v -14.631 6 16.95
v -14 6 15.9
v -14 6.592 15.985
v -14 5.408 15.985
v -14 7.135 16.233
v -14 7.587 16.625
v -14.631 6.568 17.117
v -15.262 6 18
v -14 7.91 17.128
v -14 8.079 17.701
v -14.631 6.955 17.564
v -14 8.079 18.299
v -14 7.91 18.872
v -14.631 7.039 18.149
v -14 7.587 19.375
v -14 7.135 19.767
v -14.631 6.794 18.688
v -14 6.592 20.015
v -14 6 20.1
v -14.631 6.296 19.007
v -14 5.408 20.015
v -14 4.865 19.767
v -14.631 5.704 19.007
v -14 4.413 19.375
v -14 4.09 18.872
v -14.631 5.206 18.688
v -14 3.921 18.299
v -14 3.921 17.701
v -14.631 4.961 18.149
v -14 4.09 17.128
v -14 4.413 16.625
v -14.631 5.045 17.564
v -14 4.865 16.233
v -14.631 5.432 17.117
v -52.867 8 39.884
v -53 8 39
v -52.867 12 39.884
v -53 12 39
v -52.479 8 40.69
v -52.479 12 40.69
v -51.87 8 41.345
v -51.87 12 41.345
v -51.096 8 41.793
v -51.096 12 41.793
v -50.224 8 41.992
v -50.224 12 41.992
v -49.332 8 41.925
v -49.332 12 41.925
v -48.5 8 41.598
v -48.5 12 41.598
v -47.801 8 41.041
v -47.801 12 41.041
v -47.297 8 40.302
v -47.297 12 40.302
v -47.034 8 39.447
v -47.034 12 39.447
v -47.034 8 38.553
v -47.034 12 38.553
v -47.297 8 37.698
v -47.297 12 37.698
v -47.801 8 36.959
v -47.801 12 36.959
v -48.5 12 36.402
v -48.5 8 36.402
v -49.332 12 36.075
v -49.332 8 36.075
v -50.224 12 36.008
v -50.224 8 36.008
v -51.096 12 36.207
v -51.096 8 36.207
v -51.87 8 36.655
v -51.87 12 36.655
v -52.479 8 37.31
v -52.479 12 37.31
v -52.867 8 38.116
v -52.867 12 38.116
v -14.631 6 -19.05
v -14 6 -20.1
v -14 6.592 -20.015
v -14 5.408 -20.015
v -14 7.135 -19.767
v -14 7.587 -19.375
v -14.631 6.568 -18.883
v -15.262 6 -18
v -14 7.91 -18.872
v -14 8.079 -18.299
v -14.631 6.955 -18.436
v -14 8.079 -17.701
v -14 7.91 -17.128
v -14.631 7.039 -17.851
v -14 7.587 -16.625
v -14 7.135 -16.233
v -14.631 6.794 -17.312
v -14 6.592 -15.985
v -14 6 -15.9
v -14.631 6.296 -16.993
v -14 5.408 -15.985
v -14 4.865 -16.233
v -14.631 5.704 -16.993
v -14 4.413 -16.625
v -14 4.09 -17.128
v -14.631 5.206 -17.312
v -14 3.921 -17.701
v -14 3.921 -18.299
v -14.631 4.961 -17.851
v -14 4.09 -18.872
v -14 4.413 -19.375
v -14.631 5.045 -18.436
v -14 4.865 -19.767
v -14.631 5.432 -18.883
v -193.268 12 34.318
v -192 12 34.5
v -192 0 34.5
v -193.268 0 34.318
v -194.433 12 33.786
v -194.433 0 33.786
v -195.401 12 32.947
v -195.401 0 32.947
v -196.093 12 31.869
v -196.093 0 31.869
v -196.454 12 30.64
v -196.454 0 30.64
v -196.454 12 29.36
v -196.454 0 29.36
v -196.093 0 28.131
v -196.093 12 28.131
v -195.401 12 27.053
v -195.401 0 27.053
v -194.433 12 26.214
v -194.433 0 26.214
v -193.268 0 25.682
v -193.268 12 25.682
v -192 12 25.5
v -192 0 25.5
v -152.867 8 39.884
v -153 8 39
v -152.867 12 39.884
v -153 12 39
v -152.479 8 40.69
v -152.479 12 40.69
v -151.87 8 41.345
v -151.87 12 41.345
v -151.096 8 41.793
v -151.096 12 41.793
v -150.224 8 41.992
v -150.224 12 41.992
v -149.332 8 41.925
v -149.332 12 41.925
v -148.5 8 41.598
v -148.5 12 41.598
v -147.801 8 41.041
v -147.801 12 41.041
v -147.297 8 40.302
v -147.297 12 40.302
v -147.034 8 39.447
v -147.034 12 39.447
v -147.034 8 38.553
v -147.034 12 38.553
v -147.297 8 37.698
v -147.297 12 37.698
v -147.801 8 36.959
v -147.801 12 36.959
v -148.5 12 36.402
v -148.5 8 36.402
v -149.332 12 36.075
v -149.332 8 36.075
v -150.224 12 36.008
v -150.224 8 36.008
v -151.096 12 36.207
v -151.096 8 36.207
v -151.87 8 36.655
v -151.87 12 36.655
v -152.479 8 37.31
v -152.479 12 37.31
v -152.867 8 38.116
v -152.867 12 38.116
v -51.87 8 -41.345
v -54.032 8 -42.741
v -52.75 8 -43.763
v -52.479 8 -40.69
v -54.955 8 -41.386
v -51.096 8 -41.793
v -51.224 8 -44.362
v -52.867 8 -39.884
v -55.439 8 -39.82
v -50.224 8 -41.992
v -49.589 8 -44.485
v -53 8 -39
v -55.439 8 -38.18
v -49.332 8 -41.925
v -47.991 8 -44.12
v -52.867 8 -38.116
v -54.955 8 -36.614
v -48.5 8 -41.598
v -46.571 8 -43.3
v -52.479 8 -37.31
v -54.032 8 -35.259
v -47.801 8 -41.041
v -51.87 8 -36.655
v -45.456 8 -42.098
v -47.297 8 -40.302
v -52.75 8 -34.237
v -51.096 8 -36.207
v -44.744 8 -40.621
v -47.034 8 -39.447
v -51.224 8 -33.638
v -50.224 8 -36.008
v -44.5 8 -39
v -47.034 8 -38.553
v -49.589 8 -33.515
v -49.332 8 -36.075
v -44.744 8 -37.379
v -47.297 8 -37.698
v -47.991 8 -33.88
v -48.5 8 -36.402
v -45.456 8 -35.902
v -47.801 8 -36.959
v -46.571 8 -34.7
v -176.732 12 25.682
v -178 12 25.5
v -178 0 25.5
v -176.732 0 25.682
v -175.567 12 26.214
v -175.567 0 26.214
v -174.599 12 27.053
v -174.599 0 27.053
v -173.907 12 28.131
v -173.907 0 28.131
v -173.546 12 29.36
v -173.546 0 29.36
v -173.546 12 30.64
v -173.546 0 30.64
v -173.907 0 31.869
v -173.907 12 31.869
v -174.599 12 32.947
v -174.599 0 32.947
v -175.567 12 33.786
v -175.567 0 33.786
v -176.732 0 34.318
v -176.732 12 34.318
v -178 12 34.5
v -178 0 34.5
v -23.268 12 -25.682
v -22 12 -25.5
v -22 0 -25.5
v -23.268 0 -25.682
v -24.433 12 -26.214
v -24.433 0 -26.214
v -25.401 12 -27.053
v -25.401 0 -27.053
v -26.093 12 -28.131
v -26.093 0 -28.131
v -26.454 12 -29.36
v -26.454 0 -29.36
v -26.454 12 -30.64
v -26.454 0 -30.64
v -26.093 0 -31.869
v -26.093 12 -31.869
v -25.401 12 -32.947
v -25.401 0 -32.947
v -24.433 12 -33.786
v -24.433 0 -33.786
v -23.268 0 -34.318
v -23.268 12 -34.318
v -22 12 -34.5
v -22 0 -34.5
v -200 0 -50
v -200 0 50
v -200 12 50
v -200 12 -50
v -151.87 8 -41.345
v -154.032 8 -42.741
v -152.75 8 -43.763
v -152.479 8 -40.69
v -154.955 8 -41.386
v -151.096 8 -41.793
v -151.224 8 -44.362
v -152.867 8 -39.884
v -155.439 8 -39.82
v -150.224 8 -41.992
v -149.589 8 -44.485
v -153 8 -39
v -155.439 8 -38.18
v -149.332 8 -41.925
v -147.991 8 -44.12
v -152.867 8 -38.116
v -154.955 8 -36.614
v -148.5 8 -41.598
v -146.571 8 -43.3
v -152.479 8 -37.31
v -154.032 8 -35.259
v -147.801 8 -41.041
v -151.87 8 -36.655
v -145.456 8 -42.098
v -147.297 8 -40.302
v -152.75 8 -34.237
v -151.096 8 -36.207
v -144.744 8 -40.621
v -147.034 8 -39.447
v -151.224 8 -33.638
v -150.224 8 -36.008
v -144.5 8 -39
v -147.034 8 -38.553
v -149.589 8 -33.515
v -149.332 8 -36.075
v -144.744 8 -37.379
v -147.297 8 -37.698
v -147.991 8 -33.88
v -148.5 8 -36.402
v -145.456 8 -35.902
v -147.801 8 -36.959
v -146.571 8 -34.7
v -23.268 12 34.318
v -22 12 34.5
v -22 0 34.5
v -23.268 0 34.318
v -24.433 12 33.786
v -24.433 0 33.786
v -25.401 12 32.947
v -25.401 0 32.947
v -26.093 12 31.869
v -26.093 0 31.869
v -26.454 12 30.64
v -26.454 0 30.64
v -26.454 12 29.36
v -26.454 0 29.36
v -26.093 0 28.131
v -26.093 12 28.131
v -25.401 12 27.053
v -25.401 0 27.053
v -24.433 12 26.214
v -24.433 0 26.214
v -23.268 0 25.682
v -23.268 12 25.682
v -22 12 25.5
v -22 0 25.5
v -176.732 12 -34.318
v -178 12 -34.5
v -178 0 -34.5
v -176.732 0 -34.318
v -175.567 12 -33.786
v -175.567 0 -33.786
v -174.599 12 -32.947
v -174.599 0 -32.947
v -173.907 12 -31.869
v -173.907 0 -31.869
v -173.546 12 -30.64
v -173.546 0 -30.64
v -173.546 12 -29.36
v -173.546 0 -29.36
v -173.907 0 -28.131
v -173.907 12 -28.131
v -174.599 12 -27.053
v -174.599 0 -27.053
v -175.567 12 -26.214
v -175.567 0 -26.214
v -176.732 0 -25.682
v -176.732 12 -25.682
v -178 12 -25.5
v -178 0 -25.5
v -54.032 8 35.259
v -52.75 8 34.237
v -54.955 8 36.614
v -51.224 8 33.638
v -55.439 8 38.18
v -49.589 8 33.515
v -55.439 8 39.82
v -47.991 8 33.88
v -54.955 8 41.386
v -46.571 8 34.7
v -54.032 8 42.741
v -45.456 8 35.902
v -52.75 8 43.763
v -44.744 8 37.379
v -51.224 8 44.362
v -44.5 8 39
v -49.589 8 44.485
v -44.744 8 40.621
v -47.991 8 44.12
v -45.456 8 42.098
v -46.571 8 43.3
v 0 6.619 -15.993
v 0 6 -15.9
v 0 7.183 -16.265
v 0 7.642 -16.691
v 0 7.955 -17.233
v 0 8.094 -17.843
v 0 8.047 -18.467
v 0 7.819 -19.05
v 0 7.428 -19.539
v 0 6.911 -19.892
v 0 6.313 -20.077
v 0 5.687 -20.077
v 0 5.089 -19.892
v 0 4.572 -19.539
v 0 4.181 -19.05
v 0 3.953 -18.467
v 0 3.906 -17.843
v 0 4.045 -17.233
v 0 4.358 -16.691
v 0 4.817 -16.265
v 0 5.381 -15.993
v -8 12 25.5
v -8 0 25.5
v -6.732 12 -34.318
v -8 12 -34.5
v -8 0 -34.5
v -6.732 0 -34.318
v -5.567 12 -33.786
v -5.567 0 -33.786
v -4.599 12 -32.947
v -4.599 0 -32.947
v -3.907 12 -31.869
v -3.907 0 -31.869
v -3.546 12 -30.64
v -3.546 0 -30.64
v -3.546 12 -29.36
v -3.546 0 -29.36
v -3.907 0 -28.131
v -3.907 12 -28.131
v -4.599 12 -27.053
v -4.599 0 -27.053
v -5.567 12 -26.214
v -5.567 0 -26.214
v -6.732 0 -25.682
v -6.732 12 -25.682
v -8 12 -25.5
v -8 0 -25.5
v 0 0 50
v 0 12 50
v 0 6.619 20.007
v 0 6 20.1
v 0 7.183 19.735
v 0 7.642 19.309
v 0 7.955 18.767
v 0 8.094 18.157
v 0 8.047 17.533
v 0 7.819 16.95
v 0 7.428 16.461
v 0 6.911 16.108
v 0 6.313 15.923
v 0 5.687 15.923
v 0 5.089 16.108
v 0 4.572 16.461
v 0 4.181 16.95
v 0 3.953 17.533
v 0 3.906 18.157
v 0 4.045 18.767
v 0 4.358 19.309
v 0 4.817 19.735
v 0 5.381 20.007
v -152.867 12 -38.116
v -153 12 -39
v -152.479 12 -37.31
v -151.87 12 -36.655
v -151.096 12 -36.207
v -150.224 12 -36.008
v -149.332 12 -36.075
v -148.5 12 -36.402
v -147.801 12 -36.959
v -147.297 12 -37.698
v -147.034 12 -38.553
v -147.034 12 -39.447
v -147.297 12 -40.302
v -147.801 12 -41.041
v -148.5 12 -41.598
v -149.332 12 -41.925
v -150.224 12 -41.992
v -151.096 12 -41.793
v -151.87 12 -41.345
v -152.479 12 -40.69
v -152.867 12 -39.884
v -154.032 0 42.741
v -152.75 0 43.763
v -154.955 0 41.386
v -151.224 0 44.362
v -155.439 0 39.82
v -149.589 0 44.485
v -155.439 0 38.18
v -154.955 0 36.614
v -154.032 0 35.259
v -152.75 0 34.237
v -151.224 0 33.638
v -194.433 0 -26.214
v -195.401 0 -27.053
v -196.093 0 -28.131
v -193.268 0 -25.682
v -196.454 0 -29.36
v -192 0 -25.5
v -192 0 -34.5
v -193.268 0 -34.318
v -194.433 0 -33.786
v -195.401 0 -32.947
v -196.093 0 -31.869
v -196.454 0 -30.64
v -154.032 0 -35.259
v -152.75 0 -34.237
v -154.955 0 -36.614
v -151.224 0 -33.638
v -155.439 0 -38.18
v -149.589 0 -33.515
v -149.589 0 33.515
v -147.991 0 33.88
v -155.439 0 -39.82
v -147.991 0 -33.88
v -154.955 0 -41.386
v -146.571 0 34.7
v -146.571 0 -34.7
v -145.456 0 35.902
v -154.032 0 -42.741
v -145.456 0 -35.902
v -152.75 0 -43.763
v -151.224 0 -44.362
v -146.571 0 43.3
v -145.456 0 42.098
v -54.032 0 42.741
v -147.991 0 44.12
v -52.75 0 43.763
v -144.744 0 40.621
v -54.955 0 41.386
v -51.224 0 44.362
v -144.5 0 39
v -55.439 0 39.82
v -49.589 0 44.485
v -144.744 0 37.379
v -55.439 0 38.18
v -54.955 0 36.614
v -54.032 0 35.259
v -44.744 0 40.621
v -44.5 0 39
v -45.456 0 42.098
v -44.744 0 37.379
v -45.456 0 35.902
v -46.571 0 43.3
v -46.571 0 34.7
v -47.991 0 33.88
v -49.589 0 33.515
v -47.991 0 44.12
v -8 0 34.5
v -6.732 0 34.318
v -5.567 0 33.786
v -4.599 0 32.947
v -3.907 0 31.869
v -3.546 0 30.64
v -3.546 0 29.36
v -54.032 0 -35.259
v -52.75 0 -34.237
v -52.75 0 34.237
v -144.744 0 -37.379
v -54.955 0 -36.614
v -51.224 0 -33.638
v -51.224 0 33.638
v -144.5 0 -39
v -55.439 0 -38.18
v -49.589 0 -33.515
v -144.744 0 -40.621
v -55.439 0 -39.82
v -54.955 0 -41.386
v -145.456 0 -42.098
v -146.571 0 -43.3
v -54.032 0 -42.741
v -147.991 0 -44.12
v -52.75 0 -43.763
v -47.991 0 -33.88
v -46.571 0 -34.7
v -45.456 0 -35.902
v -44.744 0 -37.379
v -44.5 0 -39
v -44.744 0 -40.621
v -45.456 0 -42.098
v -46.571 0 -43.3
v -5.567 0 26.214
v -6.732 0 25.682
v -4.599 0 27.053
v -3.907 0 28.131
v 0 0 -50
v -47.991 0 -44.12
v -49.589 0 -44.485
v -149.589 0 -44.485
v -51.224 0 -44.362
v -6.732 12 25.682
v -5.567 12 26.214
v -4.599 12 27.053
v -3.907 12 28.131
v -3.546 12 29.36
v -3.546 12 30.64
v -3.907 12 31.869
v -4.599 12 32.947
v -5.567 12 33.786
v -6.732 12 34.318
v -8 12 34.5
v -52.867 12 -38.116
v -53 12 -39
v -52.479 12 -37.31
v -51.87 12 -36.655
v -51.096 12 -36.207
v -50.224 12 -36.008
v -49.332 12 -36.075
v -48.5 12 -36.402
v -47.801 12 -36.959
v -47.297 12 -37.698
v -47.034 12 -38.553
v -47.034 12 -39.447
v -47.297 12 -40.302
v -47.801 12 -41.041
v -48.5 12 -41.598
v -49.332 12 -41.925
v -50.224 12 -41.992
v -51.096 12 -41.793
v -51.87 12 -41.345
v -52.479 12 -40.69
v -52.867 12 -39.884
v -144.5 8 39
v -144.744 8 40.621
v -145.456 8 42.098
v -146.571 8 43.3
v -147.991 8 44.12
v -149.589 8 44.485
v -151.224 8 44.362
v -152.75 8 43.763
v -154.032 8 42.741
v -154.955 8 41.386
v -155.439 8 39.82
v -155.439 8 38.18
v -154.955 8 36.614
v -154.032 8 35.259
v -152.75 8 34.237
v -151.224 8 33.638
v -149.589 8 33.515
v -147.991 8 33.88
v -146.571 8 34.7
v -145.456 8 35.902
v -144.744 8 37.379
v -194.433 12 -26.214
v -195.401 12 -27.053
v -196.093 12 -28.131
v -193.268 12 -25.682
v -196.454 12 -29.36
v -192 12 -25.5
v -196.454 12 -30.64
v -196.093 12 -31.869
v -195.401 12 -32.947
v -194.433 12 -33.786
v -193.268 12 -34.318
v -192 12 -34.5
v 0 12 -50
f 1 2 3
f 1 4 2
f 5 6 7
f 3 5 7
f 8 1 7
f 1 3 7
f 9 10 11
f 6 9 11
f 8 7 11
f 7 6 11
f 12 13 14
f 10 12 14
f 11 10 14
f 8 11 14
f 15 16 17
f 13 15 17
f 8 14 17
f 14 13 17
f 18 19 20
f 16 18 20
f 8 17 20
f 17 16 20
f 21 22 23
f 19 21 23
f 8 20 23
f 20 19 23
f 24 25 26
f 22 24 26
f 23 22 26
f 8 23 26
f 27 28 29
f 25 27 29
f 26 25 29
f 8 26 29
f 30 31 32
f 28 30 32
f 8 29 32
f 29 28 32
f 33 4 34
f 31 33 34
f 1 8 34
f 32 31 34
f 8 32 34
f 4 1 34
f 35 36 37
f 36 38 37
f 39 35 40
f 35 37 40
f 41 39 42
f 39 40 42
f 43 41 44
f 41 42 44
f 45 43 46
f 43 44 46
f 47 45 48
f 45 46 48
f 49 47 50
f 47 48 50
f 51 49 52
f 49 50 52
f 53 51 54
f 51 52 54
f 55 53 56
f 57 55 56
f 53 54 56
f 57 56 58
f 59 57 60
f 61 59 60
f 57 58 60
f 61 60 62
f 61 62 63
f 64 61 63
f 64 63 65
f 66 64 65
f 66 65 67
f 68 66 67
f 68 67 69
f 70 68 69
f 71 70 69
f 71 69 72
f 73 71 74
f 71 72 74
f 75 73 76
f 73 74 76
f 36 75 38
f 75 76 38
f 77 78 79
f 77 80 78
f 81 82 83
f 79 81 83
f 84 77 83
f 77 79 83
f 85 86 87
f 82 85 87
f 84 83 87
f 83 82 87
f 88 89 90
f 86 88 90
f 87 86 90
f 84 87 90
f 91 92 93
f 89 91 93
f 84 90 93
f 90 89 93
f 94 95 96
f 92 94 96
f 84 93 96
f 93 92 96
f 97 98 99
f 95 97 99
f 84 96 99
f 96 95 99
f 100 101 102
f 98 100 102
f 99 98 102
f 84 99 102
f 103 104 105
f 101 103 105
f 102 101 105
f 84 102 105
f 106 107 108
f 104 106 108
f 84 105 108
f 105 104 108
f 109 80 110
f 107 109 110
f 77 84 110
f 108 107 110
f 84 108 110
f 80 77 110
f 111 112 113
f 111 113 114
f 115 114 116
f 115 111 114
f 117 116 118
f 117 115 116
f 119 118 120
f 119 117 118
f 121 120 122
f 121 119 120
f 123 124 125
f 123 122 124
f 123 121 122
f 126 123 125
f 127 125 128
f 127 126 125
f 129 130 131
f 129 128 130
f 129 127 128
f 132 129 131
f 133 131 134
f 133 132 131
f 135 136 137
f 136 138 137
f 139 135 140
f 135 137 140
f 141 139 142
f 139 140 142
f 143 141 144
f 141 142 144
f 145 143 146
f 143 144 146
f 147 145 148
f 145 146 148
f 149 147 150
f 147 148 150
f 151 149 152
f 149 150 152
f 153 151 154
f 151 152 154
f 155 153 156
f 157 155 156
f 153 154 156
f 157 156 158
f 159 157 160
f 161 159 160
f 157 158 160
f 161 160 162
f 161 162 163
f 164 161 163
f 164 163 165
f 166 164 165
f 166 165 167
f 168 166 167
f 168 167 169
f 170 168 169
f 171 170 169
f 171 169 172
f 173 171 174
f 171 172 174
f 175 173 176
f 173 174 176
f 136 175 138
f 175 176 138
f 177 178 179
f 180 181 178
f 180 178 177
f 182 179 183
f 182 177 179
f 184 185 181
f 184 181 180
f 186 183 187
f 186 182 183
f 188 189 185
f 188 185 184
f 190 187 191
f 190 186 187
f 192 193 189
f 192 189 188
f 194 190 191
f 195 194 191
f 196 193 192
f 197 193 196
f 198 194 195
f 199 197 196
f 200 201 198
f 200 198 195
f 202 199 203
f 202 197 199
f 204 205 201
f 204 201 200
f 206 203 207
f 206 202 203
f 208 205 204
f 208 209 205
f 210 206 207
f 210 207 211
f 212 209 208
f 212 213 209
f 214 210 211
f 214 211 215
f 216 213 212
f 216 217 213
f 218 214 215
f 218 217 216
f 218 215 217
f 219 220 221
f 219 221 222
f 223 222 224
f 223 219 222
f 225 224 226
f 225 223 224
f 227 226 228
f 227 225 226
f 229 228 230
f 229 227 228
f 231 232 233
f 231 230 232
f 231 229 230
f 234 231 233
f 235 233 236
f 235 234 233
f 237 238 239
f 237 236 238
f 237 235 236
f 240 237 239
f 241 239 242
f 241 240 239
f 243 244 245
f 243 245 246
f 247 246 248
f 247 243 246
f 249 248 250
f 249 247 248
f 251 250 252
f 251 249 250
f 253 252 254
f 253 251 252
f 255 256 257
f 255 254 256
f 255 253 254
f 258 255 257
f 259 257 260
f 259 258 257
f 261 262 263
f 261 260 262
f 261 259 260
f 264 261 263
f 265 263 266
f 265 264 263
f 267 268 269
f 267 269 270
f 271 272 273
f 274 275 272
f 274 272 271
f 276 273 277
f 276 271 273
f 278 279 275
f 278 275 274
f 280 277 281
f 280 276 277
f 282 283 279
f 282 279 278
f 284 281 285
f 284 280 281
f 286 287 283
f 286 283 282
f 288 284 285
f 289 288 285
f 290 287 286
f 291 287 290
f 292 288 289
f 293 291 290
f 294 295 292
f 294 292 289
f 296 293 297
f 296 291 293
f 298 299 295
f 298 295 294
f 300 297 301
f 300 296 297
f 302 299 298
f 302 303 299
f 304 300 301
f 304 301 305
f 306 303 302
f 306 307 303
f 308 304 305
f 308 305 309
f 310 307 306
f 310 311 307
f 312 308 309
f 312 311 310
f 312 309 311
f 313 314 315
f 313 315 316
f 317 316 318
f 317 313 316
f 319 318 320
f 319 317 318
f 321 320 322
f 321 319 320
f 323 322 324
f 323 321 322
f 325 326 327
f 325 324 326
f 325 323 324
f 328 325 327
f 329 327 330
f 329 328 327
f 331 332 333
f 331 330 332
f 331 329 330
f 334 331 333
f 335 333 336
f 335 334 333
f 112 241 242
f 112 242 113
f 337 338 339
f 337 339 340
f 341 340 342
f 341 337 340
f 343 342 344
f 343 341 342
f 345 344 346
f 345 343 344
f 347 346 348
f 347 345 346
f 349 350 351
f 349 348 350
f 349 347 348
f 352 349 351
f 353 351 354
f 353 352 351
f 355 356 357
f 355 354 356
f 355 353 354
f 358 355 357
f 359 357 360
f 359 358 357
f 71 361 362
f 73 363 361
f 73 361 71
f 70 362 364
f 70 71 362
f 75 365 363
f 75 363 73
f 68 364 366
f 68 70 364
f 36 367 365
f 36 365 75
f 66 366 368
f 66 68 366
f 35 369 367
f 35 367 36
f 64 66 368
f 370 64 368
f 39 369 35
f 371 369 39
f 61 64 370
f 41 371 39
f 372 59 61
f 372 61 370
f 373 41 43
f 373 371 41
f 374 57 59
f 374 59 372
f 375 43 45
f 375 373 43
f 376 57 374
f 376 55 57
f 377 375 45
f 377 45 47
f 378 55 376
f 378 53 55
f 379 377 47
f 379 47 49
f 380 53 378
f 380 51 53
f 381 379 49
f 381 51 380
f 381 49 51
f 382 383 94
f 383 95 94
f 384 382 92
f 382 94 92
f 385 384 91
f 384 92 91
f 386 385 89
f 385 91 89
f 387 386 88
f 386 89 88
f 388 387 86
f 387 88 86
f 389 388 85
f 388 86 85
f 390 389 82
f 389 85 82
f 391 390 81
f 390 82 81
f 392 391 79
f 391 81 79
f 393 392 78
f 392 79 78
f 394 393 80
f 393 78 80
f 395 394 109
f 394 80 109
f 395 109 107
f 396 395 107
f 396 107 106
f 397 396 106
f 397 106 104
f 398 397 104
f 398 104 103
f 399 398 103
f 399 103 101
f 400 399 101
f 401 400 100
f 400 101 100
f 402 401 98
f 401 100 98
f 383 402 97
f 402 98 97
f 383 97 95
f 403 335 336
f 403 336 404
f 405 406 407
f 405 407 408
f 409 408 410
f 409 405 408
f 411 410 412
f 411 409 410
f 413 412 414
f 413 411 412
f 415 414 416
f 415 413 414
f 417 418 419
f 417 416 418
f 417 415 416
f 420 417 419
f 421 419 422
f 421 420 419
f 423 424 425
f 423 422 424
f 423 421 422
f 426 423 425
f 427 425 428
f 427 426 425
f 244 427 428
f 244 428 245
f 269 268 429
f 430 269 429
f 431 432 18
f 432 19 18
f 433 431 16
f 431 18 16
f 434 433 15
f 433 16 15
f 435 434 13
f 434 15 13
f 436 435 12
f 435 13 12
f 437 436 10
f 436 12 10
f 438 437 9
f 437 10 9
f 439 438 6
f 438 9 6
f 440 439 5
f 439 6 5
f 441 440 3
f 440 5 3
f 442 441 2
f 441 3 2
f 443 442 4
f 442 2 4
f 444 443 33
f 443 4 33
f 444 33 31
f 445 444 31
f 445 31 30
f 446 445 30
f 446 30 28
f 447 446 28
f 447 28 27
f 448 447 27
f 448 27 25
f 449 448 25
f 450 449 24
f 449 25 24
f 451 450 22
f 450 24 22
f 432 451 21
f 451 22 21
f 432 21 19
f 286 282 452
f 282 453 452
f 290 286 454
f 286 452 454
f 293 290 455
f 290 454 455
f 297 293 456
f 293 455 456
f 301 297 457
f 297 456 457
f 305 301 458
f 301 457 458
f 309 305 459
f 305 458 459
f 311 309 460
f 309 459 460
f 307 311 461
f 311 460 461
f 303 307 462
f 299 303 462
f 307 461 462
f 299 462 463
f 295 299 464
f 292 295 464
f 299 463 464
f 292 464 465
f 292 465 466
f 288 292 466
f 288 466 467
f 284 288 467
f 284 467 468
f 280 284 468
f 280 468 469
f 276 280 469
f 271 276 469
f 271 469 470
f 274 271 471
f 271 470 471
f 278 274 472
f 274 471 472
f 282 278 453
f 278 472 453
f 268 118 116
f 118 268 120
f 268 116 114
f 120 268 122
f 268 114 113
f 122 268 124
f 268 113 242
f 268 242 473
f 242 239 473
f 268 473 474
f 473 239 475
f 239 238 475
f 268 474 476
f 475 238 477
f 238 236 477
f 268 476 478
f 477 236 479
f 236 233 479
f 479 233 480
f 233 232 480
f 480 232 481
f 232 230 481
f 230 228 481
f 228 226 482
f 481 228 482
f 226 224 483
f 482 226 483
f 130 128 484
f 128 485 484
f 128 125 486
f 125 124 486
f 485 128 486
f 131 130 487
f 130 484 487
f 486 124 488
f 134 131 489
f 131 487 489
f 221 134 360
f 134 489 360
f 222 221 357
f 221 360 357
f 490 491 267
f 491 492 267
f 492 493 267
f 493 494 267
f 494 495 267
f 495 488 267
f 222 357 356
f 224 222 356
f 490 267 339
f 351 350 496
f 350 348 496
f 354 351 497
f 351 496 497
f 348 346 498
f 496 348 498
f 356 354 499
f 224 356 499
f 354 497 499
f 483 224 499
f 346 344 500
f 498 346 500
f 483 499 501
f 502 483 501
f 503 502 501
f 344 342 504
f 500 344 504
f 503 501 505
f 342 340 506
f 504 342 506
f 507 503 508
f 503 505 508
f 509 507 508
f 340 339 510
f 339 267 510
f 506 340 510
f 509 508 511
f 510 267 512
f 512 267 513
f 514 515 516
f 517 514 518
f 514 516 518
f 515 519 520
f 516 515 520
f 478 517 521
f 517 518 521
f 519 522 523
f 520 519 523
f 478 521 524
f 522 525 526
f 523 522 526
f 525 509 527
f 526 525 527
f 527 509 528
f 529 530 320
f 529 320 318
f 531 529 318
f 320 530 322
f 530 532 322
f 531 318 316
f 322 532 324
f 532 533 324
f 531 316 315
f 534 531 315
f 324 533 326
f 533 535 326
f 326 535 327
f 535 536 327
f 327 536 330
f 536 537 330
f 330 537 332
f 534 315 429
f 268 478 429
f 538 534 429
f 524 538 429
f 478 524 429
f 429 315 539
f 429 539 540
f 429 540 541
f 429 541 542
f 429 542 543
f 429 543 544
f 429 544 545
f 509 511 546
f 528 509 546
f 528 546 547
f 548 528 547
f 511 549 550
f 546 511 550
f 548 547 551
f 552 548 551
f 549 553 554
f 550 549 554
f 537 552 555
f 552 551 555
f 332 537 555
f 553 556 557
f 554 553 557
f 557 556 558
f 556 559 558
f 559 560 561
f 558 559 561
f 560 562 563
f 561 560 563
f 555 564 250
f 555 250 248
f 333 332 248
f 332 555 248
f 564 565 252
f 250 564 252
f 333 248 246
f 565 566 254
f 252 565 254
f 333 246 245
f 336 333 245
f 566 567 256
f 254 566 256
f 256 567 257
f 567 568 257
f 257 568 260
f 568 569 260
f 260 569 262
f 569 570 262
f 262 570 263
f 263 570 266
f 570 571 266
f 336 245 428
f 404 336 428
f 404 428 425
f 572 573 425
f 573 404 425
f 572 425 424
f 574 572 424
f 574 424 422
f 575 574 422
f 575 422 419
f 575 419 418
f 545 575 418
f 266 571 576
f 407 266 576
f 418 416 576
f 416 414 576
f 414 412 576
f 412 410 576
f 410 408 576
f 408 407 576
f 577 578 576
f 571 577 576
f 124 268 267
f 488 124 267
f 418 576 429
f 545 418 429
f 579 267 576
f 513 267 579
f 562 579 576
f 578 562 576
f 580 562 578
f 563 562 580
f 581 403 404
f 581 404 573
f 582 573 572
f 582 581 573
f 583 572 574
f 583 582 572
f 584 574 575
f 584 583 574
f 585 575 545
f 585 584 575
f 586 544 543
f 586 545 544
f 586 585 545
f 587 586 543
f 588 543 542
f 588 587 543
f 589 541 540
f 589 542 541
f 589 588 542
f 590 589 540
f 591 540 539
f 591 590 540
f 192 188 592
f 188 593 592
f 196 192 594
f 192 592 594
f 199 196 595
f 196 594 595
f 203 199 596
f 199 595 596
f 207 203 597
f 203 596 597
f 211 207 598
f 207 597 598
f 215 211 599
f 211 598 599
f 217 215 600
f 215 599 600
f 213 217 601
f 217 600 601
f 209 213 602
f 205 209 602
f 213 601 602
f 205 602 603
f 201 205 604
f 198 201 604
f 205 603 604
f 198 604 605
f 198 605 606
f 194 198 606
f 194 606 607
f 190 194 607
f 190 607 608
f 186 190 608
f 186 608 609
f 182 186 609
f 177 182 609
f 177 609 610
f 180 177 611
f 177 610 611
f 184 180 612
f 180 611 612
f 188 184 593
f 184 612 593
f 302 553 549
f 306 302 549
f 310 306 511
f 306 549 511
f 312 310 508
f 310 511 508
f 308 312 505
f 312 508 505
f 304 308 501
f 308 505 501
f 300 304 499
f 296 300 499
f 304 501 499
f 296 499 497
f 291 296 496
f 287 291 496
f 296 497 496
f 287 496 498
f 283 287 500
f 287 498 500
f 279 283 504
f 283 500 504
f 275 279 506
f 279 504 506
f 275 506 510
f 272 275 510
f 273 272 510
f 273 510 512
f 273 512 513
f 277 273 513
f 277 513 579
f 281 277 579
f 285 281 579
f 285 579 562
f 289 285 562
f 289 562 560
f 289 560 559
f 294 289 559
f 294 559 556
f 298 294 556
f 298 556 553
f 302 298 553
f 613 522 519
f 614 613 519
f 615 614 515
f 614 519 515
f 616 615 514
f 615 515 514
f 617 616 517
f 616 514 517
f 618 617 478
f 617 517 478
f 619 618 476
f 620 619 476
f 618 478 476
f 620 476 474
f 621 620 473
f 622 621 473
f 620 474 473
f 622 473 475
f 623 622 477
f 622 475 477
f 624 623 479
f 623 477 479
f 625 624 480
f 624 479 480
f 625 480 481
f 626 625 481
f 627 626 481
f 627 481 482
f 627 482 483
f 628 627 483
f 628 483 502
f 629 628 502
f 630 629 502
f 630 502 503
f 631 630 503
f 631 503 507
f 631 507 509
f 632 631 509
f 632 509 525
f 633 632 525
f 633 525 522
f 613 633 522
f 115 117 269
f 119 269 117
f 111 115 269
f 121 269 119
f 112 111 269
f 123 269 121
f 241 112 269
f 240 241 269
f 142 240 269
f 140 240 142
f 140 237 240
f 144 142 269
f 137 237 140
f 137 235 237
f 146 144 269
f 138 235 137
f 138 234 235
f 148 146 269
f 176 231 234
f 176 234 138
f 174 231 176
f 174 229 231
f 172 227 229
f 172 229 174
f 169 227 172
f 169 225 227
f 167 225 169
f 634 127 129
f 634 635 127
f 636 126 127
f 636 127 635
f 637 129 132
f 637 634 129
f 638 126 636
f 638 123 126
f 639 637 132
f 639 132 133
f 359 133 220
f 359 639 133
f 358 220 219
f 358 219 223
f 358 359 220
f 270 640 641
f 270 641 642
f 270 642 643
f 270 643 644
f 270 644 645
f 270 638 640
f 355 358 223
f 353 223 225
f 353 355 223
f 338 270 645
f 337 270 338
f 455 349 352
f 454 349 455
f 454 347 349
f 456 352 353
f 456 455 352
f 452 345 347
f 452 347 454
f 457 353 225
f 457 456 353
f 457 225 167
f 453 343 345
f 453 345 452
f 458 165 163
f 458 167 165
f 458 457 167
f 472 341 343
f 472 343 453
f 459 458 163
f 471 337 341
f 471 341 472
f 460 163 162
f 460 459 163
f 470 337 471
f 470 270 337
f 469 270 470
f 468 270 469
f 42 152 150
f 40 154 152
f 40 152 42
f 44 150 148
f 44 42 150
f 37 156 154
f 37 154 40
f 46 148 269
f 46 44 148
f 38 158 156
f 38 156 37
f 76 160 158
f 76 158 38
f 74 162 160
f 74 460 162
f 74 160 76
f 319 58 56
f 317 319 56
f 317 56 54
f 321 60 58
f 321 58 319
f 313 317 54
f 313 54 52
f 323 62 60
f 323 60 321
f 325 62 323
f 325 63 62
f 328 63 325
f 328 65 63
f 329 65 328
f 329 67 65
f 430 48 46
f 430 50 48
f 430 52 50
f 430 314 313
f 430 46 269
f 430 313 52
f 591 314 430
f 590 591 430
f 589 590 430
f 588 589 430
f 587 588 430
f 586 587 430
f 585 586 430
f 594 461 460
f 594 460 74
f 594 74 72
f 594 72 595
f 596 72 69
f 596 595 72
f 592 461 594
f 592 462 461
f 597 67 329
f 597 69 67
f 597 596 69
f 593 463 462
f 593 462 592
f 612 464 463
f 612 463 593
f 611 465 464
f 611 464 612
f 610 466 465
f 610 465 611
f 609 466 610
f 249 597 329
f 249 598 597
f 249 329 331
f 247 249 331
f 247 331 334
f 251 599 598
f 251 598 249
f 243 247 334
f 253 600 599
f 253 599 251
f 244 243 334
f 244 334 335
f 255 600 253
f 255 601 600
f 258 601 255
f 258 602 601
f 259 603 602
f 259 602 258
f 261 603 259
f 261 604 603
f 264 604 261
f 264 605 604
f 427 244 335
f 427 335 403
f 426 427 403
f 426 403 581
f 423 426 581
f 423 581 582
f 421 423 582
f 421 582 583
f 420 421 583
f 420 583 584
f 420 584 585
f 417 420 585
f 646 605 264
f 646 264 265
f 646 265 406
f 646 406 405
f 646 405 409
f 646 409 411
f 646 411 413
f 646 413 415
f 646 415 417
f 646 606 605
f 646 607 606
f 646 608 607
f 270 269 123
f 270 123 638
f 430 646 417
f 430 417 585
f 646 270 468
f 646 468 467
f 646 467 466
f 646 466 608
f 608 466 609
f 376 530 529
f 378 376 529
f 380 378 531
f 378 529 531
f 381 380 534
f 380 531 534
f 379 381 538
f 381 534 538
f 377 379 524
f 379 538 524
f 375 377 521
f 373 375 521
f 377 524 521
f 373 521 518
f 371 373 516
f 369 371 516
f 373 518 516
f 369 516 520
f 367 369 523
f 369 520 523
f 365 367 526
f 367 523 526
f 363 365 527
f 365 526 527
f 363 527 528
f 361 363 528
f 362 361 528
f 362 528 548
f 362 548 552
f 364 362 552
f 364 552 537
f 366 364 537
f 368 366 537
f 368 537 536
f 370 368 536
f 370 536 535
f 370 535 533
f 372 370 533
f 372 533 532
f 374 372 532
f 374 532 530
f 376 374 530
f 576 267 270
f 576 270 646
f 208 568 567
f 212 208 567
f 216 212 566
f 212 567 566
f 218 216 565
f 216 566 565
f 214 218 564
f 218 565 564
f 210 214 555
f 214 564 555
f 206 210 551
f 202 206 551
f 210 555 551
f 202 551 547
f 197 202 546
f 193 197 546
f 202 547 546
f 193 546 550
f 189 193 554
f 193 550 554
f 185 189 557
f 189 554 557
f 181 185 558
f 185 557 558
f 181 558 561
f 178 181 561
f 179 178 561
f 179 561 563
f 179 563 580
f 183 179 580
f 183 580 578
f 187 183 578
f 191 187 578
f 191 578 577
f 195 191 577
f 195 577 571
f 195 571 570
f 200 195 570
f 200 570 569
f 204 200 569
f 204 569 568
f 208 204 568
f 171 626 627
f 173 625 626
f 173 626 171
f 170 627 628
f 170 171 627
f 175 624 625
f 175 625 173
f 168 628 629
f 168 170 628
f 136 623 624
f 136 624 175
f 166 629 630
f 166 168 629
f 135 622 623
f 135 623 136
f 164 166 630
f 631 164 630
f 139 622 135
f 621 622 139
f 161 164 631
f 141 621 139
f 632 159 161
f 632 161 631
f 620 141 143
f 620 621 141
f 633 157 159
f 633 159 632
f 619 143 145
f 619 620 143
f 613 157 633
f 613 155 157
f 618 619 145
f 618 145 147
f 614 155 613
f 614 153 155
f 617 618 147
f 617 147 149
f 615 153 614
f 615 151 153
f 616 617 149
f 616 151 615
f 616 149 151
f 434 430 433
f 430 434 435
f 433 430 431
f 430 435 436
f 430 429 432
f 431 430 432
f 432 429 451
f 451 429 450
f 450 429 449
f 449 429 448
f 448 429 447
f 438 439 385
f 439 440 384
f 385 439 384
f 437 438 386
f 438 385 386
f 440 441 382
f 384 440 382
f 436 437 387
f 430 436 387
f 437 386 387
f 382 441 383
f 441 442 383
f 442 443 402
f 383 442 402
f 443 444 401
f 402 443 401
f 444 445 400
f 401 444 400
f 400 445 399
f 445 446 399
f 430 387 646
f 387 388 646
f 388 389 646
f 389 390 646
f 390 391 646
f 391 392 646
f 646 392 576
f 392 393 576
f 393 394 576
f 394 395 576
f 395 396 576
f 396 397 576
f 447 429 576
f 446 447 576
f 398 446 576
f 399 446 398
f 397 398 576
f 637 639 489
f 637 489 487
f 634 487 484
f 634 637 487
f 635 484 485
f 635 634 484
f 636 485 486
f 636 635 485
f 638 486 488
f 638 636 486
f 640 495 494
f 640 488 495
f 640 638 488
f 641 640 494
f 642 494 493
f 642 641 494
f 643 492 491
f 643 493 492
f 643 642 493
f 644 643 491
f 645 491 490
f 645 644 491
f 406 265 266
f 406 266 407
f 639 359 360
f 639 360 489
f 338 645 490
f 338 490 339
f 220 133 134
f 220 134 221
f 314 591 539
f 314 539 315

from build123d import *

# Parameters (mm, degrees)
SKETCH1_W                                       = 200
SKETCH1_H                                       = 100
BOSS_EXTRUDE1_DEPTH                             = 12
CUT_EXTRUDE1_DEPTH                              = 207.504237245
CBORE_FOR_M5_SOCKET_HEAD_CAP_SCREW1_D           = 6
CBORE_FOR_M5_SOCKET_HEAD_CAP_SCREW1_CBORE_D     = 11
CBORE_FOR_M5_SOCKET_HEAD_CAP_SCREW1_CBORE_DEPTH = 8
M5X0_8_TAPPED_HOLE1_D                           = 4.2
M5X0_8_TAPPED_HOLE1_DEPTH                       = 14
M5X0_8_TAPPED_HOLE1_TIP                         = 1.2618073


with BuildPart() as part:
    # Sketch1 → Boss-Extrude1 (new body)
    with BuildSketch(Plane(origin=(0, 0, 0), x_dir=(1, 0, 0), z_dir=(0, 1, 0))):
        with Locations((-100, 0)):
            Rectangle(SKETCH1_W, SKETCH1_H)
    extrude(amount=BOSS_EXTRUDE1_DEPTH)

    # Sketch2 → Cut-Extrude1 (cut, through all)
    with BuildSketch(Plane(origin=(0, 12, 0), x_dir=(1, 0, 0), z_dir=(0, 1, 0))):
        with BuildLine():
            Line((-192, -25.5), (-178, -25.5))
            ThreePointArc((-178, -25.5), (-173.5, -30), (-178, -34.5))
            Line((-178, -34.5), (-192, -34.5))
            ThreePointArc((-192, -34.5), (-196.5, -30), (-192, -25.5))
        make_face()
        with BuildLine():
            Line((-192, 34.5), (-178, 34.5))
            ThreePointArc((-178, 34.5), (-173.5, 30), (-178, 25.5))
            Line((-178, 25.5), (-192, 25.5))
            ThreePointArc((-192, 25.5), (-196.5, 30), (-192, 34.5))
        make_face()
        with BuildLine():
            Line((-22, 34.5), (-8, 34.5))
            ThreePointArc((-8, 34.5), (-3.5, 30), (-8, 25.5))
            Line((-8, 25.5), (-22, 25.5))
            ThreePointArc((-22, 25.5), (-26.5, 30), (-22, 34.5))
        make_face()
        with BuildLine():
            Line((-22, -25.5), (-8, -25.5))
            ThreePointArc((-8, -25.5), (-3.5, -30), (-8, -34.5))
            Line((-8, -34.5), (-22, -34.5))
            ThreePointArc((-22, -34.5), (-26.5, -30), (-22, -25.5))
        make_face()
    extrude(amount=-CUT_EXTRUDE1_DEPTH, mode=Mode.SUBTRACT)

    # CBORE for M5 Socket Head Cap Screw1 (through all)
    with Locations(Plane.XZ):
        with Locations((-150, 39), (-50, 39), (-150, -39), (-50, -39)):
            CounterBoreHole(CBORE_FOR_M5_SOCKET_HEAD_CAP_SCREW1_D / 2, CBORE_FOR_M5_SOCKET_HEAD_CAP_SCREW1_CBORE_D / 2, CBORE_FOR_M5_SOCKET_HEAD_CAP_SCREW1_CBORE_DEPTH)

    # M5x0.8 Tapped Hole1
    with Locations(Plane(origin=(0, 0, 0), x_dir=(0, 0, -1), z_dir=(1, 0, 0))):
        with Locations((18, 6), (-18, 6)):
            Hole(M5X0_8_TAPPED_HOLE1_D / 2, depth=M5X0_8_TAPPED_HOLE1_DEPTH)
            with Locations((0, 0, -(M5X0_8_TAPPED_HOLE1_DEPTH + M5X0_8_TAPPED_HOLE1_TIP / 2))):  # 118° drill point
                Cone(0, M5X0_8_TAPPED_HOLE1_D / 2, M5X0_8_TAPPED_HOLE1_TIP, mode=Mode.SUBTRACT)


solid = part.part
